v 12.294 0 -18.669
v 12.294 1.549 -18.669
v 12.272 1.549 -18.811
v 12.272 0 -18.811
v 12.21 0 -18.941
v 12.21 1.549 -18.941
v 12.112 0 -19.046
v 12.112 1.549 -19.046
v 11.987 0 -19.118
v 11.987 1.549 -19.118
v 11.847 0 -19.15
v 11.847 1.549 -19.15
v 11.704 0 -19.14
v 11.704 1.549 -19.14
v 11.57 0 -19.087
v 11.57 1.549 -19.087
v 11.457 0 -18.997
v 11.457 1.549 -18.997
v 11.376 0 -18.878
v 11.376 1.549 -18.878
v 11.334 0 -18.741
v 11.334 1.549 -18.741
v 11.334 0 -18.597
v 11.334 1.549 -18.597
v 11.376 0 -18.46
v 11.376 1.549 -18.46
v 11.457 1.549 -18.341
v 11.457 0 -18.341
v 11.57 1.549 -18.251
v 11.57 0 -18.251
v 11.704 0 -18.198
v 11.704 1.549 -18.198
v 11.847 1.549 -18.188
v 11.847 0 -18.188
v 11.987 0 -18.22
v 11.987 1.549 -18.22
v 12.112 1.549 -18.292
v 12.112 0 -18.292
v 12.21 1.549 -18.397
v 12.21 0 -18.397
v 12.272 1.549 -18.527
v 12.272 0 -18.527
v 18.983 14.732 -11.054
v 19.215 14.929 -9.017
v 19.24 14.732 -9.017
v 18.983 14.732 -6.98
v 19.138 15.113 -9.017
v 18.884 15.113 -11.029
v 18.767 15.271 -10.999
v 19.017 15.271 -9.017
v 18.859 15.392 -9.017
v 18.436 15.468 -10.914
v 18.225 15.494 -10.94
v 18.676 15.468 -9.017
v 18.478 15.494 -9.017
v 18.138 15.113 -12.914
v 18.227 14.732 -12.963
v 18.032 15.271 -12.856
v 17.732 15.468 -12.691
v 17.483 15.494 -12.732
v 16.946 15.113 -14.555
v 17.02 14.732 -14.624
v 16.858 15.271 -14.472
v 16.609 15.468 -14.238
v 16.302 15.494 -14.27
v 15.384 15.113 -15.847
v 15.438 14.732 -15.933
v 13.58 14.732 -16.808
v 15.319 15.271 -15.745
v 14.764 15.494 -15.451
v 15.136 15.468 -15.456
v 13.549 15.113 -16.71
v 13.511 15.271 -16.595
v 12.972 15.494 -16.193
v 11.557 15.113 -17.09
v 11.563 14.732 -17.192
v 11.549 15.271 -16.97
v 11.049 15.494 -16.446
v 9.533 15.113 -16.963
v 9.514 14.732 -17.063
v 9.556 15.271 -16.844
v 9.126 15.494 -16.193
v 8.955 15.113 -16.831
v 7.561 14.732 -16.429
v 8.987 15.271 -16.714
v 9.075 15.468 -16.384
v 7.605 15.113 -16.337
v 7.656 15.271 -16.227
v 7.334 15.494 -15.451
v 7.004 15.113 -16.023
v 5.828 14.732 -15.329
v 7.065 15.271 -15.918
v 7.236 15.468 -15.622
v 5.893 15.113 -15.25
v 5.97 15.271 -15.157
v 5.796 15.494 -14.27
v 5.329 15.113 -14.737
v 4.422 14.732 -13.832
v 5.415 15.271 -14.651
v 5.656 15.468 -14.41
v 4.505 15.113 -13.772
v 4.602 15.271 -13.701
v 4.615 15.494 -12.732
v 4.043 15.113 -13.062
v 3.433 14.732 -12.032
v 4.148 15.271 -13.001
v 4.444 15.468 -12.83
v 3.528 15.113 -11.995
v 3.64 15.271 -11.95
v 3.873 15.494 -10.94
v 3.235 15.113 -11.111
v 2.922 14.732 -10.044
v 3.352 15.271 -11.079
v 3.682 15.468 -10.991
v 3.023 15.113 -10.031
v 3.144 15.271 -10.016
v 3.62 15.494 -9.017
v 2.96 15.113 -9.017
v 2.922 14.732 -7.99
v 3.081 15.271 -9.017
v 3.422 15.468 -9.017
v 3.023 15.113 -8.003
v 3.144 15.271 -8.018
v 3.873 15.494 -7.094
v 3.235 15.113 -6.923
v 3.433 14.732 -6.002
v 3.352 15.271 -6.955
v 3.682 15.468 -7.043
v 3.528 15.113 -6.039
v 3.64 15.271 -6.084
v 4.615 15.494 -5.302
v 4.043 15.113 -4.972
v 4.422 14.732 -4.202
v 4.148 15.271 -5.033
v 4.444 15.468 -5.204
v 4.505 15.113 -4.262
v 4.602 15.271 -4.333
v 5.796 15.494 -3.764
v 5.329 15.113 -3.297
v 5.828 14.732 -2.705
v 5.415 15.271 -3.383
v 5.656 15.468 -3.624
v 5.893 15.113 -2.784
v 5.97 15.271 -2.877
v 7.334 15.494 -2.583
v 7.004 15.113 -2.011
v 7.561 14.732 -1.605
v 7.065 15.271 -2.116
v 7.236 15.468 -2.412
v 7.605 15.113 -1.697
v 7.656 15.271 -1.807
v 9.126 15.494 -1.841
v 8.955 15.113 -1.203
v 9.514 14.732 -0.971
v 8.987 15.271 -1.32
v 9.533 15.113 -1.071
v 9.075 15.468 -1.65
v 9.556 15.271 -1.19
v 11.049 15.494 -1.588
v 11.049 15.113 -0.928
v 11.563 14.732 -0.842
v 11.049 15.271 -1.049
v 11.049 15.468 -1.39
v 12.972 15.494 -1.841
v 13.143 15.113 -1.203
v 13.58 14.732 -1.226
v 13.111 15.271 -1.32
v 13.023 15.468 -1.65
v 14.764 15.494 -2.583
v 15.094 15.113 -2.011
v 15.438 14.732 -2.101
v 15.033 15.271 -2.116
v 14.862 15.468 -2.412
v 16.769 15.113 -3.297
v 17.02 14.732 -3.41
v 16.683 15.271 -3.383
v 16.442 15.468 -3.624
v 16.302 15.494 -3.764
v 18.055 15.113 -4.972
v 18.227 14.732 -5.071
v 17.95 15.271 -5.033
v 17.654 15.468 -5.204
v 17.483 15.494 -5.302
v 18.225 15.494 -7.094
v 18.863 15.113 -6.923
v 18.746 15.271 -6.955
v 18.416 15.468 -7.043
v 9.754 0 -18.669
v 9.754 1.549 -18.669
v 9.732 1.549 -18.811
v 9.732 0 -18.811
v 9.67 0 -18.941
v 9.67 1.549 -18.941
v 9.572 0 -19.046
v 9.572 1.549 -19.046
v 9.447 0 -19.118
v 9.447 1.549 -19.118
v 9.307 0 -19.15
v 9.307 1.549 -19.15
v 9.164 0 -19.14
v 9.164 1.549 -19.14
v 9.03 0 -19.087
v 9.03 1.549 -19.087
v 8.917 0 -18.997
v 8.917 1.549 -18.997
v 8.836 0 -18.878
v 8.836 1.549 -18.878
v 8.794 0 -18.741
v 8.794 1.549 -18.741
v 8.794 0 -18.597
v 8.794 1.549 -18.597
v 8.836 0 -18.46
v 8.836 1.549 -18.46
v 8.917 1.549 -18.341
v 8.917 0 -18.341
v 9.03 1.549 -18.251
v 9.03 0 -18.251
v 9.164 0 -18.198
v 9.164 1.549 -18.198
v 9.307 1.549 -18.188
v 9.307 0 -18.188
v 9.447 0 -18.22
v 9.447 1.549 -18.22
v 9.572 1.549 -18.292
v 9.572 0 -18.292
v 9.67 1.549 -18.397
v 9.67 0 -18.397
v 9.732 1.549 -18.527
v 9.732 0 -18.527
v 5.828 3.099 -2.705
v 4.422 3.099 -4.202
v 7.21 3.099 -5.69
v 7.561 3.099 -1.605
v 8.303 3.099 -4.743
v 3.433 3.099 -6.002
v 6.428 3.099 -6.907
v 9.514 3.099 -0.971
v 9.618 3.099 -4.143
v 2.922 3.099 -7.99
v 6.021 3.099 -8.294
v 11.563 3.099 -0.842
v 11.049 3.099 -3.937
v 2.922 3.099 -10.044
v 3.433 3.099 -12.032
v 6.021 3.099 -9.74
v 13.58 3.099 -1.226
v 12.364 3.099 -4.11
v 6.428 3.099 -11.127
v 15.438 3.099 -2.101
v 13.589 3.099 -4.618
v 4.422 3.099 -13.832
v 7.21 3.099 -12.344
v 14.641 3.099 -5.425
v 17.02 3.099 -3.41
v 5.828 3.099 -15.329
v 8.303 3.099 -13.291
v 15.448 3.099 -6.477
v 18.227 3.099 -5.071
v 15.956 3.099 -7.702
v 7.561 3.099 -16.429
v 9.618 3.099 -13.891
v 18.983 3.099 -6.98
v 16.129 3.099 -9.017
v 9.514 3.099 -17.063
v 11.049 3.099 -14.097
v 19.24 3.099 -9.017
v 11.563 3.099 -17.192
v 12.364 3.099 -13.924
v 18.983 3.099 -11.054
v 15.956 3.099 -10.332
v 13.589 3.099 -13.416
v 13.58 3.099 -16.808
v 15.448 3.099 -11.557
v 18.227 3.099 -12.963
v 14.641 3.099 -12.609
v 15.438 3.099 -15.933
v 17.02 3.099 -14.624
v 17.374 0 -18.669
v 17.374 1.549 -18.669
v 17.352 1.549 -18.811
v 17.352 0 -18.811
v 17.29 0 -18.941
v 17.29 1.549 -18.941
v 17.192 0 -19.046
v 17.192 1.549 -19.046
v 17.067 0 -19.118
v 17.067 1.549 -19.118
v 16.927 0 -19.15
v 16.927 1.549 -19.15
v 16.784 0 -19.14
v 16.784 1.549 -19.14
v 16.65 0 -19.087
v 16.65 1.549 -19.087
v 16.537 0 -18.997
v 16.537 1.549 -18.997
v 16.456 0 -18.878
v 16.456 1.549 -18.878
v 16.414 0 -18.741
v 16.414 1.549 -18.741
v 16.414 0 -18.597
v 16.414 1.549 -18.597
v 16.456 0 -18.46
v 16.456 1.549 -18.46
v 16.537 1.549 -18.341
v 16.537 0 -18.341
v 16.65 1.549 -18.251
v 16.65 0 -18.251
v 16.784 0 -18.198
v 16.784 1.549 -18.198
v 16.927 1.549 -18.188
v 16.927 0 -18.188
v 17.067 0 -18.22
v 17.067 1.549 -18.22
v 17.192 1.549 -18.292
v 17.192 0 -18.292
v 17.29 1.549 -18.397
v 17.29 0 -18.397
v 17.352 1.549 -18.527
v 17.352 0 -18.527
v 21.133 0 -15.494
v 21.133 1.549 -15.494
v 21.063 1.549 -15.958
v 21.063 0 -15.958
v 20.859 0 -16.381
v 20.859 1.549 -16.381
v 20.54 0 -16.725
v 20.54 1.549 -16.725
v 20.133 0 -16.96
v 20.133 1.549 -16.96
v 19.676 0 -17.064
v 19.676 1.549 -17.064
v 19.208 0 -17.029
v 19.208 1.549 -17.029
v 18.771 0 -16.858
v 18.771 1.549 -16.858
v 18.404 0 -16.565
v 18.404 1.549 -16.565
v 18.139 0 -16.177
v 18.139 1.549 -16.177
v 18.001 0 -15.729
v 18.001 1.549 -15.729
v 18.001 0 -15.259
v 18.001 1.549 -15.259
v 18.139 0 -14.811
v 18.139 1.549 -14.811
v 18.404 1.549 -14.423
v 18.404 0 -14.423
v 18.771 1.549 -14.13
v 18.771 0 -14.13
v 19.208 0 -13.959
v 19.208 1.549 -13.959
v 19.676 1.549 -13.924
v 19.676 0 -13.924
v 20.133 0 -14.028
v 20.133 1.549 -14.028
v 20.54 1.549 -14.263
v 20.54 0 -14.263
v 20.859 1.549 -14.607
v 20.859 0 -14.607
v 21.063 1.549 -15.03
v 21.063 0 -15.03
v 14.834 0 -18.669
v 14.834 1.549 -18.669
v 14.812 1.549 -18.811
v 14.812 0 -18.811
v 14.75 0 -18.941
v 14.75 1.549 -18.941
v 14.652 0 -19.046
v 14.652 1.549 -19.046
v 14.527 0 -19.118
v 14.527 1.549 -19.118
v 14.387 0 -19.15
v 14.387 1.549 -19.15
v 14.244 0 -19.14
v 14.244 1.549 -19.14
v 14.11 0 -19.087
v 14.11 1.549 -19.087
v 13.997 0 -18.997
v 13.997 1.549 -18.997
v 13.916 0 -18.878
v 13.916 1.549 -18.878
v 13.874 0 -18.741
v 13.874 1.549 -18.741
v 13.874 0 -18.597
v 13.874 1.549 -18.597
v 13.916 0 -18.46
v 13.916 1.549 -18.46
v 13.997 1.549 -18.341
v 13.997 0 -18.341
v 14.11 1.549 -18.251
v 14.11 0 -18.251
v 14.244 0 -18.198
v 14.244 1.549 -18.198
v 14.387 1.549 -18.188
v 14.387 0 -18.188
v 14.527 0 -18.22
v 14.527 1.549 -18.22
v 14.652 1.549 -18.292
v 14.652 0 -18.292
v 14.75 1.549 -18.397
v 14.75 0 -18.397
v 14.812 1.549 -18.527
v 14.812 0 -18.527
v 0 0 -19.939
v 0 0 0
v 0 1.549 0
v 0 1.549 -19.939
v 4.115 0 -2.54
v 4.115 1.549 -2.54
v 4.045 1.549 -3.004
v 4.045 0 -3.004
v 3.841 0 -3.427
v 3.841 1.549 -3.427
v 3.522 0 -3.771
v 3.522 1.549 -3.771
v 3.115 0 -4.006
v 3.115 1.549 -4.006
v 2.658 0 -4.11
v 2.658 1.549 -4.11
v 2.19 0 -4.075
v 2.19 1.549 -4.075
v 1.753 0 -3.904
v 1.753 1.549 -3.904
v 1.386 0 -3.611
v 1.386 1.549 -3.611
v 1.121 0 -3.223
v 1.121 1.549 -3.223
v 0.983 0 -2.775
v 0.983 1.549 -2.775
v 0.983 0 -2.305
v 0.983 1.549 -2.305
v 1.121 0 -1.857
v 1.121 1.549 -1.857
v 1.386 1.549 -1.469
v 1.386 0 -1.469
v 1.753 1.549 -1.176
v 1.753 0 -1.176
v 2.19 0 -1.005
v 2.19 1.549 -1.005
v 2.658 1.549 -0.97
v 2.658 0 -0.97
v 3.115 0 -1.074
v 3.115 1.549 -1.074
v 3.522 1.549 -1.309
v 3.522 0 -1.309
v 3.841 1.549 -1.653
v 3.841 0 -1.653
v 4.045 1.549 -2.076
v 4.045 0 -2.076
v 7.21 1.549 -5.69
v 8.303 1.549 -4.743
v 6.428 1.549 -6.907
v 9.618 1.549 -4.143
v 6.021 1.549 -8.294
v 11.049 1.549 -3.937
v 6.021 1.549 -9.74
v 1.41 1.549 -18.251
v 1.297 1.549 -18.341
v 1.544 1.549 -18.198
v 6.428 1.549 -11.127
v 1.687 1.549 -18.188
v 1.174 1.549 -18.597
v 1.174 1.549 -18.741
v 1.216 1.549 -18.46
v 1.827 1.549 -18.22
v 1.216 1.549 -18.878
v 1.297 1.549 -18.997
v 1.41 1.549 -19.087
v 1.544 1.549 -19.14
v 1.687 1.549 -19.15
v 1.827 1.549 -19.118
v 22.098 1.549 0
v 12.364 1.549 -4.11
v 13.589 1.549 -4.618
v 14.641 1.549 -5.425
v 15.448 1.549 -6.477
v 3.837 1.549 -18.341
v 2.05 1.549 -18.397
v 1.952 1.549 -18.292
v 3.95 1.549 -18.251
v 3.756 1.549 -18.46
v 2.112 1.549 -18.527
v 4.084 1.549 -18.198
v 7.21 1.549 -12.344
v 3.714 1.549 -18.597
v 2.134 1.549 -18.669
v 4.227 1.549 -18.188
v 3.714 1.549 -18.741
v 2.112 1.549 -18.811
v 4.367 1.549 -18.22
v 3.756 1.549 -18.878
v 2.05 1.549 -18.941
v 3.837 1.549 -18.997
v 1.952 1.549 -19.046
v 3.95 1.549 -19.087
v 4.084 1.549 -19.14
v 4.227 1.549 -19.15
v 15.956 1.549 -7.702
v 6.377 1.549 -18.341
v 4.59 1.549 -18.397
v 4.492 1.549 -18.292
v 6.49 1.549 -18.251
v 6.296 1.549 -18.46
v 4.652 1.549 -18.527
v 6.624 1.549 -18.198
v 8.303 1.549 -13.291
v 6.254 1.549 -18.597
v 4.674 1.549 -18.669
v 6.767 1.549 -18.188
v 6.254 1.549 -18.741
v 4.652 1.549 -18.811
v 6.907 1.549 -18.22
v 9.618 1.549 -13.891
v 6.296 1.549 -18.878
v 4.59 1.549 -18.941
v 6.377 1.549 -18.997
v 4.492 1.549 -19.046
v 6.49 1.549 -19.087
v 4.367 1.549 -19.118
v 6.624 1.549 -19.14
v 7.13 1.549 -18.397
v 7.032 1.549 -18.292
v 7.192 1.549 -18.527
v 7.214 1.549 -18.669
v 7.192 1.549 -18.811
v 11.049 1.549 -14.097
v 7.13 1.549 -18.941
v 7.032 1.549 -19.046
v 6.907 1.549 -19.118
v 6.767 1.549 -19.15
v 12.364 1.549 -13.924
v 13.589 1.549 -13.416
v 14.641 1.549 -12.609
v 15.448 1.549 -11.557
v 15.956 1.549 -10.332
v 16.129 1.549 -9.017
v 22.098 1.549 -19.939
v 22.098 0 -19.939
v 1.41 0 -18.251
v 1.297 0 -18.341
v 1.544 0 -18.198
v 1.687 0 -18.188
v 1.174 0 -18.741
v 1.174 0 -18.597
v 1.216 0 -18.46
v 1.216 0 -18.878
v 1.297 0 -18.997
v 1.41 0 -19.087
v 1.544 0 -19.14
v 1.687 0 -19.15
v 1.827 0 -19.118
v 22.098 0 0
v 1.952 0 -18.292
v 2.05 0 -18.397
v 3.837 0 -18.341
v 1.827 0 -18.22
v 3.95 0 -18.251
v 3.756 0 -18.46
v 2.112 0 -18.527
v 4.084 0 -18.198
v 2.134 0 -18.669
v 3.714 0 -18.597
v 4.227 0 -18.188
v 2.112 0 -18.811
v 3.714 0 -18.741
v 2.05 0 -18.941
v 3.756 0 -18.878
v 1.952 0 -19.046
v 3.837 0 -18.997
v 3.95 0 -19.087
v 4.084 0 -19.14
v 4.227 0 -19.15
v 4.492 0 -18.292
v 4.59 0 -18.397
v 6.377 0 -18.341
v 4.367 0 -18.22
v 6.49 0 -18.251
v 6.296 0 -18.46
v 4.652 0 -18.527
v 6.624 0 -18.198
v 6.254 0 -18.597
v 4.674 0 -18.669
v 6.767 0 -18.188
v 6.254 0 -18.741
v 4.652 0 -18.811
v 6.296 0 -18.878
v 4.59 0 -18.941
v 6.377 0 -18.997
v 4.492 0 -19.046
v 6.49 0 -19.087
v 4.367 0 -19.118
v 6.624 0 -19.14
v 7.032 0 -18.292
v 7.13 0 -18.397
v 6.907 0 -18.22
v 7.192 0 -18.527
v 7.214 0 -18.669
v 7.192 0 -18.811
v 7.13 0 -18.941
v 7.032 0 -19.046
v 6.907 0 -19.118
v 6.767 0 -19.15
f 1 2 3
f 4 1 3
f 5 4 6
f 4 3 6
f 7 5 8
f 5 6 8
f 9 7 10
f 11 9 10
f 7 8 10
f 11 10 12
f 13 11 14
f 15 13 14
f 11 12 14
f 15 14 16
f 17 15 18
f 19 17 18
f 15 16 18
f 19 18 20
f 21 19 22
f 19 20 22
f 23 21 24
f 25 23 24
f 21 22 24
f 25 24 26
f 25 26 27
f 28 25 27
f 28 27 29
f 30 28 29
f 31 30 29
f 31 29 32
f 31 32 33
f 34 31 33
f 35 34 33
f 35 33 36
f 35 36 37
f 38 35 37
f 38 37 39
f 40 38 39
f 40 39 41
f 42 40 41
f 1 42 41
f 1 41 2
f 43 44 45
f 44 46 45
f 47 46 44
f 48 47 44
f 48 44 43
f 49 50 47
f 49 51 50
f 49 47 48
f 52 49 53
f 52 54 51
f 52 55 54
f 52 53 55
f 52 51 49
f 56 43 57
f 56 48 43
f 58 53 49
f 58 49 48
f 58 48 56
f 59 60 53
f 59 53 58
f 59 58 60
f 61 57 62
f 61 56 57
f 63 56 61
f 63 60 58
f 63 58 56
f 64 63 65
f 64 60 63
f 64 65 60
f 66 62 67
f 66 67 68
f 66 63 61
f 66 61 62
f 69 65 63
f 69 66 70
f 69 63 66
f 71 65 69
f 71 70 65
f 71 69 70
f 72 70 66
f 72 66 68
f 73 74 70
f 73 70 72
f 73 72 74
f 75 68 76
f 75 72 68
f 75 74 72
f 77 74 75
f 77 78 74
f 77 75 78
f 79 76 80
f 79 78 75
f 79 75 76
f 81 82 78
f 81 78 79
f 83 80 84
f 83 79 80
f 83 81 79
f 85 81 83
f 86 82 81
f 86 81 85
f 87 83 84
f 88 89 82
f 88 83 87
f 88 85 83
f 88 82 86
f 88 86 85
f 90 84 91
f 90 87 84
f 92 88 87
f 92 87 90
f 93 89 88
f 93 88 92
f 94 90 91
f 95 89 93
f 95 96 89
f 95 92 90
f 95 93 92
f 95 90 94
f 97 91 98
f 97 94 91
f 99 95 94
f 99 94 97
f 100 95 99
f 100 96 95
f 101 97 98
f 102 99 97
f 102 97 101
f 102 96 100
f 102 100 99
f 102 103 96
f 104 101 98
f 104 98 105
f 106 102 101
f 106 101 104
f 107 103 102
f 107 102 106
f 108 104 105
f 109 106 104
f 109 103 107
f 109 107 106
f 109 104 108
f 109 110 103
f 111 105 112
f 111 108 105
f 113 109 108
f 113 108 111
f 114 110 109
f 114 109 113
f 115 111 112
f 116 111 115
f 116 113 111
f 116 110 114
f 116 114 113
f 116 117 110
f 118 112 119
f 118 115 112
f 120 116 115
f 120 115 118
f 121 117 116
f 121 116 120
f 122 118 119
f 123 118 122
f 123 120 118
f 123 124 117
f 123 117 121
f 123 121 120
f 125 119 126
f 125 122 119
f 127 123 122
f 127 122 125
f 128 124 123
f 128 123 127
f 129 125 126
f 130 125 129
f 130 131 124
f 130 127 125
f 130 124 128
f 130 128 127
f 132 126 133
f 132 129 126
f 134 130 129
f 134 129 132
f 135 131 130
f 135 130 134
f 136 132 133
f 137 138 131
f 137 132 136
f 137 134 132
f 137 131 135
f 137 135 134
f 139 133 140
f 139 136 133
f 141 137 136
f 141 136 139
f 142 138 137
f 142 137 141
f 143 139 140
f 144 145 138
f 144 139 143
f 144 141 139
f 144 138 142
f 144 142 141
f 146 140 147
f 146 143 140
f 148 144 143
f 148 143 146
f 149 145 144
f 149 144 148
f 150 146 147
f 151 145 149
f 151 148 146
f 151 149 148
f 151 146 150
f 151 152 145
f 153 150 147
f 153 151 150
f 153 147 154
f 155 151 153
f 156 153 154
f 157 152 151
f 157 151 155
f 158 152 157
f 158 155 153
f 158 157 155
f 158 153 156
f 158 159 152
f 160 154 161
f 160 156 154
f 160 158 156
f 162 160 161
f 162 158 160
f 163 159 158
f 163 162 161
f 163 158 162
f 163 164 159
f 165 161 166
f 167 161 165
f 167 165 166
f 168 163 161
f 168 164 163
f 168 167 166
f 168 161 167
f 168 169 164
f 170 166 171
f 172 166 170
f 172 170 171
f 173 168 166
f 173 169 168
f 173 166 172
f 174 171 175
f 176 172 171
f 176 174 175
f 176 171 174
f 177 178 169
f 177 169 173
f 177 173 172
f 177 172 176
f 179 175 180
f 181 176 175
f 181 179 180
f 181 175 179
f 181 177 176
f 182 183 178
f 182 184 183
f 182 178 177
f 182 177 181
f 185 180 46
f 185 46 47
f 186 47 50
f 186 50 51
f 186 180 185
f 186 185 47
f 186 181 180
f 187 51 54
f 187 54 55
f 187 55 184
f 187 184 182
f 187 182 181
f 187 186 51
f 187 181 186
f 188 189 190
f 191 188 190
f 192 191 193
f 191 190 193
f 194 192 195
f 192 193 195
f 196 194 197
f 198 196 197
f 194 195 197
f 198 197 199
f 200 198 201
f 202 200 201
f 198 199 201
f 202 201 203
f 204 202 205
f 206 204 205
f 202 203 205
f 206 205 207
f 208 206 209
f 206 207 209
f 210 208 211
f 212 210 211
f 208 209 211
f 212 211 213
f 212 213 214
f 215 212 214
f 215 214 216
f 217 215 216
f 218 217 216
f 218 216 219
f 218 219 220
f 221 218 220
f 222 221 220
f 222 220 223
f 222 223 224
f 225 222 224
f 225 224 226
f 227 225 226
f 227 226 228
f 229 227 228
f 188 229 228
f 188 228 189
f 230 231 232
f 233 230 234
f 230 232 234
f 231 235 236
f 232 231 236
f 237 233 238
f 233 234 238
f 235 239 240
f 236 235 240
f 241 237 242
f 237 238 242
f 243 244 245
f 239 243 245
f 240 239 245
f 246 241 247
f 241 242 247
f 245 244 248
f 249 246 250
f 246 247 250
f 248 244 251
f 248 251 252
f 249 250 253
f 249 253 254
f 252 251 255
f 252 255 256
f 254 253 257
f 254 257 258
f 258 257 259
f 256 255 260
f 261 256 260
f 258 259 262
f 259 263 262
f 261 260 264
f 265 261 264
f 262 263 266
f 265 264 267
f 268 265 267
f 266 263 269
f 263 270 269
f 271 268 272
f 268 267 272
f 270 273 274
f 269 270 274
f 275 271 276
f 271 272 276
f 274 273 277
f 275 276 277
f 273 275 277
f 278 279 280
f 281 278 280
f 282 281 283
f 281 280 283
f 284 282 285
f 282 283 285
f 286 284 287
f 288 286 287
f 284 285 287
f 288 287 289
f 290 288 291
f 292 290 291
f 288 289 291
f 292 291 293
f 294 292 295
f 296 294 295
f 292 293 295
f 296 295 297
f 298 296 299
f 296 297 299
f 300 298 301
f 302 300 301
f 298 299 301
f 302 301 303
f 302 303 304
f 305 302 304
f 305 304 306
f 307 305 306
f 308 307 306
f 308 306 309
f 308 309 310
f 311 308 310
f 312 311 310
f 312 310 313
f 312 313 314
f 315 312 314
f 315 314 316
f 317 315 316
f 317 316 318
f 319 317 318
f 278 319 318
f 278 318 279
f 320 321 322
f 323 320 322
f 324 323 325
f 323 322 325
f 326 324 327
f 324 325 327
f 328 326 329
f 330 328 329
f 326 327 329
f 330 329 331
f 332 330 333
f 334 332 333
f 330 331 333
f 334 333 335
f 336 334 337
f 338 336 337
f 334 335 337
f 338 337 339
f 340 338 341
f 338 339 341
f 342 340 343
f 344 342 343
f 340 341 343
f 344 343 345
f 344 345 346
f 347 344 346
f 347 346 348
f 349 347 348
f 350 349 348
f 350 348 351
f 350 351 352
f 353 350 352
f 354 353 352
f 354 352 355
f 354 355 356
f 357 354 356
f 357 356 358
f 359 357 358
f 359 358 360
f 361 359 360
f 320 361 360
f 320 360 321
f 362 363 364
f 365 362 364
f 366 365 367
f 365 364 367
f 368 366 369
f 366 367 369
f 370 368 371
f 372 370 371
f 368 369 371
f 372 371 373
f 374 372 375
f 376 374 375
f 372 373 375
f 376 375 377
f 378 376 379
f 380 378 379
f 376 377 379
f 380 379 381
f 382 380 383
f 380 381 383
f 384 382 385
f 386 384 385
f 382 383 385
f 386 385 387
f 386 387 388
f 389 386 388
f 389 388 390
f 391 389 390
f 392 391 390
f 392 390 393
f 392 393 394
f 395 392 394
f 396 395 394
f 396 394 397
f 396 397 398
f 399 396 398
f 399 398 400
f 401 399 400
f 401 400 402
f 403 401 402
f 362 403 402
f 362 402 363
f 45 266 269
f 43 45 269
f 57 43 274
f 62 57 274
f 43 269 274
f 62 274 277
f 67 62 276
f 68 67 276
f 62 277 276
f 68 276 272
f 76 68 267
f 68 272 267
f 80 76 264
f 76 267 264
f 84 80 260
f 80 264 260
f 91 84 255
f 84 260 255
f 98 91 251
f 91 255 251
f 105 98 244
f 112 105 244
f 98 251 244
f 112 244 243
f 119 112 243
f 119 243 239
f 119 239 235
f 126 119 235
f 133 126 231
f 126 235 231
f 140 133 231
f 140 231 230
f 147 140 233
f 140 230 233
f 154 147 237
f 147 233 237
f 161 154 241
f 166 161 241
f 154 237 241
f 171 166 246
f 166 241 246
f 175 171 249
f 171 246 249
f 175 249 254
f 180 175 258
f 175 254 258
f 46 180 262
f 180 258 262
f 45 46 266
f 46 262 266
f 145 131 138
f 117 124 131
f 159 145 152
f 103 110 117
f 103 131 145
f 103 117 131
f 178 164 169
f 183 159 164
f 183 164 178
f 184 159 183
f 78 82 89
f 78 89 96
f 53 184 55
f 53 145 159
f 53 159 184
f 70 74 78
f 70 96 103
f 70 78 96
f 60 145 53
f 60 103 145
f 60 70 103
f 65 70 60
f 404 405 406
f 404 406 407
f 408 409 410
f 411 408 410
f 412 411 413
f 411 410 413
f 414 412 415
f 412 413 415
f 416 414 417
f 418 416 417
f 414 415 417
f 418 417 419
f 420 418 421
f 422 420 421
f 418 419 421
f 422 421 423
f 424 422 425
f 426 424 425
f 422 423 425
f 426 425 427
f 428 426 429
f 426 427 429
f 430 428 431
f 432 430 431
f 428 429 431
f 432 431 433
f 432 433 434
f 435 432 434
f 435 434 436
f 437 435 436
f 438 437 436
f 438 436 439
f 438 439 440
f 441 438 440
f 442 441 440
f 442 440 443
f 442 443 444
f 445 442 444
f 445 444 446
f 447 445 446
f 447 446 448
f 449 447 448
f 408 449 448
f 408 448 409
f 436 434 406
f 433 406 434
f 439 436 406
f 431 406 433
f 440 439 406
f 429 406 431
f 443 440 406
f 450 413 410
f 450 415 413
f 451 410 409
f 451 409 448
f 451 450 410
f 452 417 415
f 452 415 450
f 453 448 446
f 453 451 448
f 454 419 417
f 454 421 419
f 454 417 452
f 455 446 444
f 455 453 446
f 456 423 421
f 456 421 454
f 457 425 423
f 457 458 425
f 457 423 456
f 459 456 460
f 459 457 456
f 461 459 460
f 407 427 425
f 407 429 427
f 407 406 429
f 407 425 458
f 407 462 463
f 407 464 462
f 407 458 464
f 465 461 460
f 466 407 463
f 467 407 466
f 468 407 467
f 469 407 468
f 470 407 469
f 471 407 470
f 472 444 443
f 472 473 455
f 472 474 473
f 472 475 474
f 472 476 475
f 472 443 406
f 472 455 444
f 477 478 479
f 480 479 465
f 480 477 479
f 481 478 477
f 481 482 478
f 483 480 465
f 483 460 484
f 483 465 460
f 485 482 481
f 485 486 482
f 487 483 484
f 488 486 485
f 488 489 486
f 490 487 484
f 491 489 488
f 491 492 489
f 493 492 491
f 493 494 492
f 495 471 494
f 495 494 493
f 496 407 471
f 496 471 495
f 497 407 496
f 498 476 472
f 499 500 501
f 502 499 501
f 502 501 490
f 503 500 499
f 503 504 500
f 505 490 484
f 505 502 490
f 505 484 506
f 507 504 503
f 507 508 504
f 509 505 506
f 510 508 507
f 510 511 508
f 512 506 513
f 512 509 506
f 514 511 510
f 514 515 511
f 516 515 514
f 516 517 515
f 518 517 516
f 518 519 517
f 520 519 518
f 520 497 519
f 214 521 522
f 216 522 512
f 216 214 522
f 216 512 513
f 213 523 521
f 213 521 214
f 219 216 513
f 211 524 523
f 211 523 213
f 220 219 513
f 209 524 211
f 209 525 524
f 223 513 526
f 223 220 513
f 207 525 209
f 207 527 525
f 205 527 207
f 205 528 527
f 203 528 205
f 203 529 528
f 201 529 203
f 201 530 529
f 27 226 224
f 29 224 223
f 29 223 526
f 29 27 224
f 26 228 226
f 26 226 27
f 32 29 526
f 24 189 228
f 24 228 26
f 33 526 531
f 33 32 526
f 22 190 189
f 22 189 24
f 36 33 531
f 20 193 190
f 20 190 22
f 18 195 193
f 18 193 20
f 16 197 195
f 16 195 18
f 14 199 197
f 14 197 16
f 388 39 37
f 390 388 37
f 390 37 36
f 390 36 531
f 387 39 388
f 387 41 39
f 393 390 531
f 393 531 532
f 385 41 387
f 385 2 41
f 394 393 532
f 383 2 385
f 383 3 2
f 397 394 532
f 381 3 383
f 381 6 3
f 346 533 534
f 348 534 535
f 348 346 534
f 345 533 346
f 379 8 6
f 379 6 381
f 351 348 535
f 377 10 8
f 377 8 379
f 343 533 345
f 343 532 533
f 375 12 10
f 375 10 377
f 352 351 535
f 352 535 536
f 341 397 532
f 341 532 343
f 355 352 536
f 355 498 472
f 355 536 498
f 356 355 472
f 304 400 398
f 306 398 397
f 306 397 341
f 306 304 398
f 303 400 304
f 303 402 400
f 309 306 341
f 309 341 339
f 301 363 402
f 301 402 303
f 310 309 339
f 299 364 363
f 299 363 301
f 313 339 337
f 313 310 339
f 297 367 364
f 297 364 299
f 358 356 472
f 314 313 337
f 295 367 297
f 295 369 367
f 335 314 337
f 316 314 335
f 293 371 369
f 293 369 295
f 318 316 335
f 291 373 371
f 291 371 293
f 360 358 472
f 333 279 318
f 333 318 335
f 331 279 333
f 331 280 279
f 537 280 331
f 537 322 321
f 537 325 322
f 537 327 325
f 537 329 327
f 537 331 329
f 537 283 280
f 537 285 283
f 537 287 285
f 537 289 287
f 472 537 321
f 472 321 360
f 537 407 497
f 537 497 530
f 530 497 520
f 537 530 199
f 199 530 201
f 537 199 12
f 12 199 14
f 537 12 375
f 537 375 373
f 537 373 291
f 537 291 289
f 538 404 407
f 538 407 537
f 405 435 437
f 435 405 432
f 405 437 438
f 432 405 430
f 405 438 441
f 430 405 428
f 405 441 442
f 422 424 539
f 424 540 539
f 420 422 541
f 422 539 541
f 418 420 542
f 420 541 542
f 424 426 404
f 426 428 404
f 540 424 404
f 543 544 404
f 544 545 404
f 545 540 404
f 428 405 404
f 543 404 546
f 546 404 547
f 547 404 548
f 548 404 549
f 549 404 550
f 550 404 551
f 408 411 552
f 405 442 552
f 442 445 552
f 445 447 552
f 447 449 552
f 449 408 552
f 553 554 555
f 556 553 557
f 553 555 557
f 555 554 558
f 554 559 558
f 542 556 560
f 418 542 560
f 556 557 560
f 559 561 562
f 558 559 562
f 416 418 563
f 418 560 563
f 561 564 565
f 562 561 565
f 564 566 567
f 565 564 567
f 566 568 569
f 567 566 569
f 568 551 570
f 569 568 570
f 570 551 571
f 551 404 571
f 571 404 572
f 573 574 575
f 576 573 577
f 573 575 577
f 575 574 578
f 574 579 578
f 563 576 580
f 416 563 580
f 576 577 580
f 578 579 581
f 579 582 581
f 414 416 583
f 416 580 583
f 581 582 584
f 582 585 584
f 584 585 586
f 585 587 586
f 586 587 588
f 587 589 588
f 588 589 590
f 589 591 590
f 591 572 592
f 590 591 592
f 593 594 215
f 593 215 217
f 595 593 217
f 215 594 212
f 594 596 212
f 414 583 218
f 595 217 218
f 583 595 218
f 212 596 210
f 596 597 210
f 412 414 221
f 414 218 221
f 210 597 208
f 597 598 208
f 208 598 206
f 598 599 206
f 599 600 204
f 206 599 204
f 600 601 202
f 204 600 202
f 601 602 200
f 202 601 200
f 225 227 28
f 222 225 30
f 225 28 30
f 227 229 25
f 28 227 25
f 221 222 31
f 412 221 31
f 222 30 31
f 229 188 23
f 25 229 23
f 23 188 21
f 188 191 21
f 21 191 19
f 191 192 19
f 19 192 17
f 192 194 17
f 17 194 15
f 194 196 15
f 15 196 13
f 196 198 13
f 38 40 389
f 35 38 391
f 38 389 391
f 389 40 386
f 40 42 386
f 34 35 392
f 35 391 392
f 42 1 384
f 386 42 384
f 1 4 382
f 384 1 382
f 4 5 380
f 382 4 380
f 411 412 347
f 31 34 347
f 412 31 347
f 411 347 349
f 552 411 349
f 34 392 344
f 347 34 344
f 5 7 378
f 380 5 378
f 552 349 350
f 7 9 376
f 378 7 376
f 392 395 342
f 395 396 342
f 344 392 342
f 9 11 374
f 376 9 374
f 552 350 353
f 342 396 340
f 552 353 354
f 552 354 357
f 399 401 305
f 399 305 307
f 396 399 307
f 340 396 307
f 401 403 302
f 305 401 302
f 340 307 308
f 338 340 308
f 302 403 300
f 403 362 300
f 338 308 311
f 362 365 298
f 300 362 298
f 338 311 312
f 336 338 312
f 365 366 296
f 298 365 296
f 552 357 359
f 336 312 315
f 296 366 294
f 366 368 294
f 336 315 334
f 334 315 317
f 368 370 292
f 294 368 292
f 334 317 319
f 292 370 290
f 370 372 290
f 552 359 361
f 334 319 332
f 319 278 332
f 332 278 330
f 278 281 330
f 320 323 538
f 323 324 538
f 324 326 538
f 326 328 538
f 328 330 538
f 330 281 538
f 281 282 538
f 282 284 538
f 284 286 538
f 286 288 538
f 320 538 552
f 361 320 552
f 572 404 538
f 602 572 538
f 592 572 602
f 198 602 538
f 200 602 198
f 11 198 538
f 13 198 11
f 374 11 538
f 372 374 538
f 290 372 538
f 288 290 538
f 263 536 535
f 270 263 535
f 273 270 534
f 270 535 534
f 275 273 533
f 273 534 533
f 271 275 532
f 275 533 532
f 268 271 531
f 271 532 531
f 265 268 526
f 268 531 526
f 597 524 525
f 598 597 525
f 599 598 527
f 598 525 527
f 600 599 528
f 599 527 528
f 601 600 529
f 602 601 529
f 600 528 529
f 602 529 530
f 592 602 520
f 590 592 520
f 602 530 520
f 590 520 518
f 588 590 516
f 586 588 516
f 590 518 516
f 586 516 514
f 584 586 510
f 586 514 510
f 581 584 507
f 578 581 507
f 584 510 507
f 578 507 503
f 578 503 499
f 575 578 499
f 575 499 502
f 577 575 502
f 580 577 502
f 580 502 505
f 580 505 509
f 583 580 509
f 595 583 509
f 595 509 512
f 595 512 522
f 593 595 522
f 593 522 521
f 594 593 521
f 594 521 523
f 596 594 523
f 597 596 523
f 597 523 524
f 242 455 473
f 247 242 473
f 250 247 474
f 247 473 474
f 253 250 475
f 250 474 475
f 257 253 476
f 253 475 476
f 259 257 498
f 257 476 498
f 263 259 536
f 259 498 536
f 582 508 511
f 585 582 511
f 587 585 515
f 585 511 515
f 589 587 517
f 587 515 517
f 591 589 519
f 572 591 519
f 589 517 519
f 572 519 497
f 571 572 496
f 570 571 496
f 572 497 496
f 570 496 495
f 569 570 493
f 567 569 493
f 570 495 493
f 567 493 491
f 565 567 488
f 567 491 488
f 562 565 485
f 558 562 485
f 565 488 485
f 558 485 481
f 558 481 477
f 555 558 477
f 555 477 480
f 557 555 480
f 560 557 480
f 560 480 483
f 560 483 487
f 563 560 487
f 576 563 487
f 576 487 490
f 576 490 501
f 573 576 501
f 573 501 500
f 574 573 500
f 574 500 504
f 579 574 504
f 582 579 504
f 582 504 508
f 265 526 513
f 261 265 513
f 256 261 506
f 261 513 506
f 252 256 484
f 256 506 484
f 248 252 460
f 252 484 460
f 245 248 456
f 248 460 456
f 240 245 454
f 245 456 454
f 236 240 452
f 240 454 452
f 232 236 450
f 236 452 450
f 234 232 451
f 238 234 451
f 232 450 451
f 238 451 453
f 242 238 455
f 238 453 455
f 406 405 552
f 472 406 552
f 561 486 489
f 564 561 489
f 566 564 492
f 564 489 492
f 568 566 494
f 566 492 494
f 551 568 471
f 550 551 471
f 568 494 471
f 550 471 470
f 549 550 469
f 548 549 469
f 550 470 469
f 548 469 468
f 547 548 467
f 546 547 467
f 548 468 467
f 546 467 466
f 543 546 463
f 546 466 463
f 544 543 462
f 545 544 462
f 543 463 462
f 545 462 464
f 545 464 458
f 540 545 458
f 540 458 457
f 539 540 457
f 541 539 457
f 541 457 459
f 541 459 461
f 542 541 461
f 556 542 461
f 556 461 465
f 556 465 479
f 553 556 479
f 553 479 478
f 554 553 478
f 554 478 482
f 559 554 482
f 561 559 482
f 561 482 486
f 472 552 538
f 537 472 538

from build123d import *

# Parameters (mm, degrees)
SKETCH2_W           = 22.098
SKETCH2_H           = 19.939
BOSS_EXTRUDE1_DEPTH = 1.5494
BOSS_EXTRUDE3_DEPTH = 1.5494
SKETCH7_R           = 8.1915
BOSS_EXTRUDE4_DEPTH = 12.3952
SKETCH8_R           = 1.5748
SKETCH8_R_2         = 0.4826
CUT_EXTRUDE1_DEPTH  = 2.5494
FILLET1_R           = 0.762


with BuildPart() as part:
    # Sketch2 → Boss-Extrude1 (new body)
    with BuildSketch(Plane(origin=(0, 0, 0), x_dir=(1, 0, 0), z_dir=(0, 1, 0))):
        with Locations((11.049, 9.9695)):
            Rectangle(SKETCH2_W, SKETCH2_H)
    extrude(amount=BOSS_EXTRUDE1_DEPTH)

    # Sketch6 → Boss-Extrude3 (add)
    with BuildSketch(Plane(origin=(0, 1.5494, 0), x_dir=(1, 0, 0), z_dir=(0, 1, 0))):
        with BuildLine():
            ThreePointArc((16.129, 9.017), (14.641102448, 12.609102448), (11.049, 14.097))
            Line((11.049, 14.097), (11.049, 9.017))
            Line((11.049, 9.017), (11.049, 3.937))
            ThreePointArc((11.049, 3.937), (14.641102448, 5.424897552), (16.129, 9.017))
        make_face()
        with BuildLine():
            Line((11.049, 9.017), (11.049, 14.097))
            ThreePointArc((11.049, 14.097), (5.969, 9.017), (11.049, 3.937))
            Line((11.049, 3.937), (11.049, 9.017))
        make_face()
    extrude(amount=BOSS_EXTRUDE3_DEPTH)

    # Sketch7 → Boss-Extrude4 (add)
    with BuildSketch(Plane(origin=(0, 3.0988, 0), x_dir=(1, 0, 0), z_dir=(0, 1, 0))):
        with Locations((11.049, 9.017)):
            Circle(SKETCH7_R)
    extrude(amount=BOSS_EXTRUDE4_DEPTH)

    # Sketch8 → Cut-Extrude1 (cut, through all)
    with BuildSketch(Plane(origin=(0, 1.5494, 0), x_dir=(1, 0, 0), z_dir=(0, 1, 0))):
        with Locations((19.558, 15.494)):
            Circle(SKETCH8_R)
        with Locations((2.54, 2.54)):
            Circle(SKETCH8_R)
        with Locations((16.891, 18.669)):
            Circle(SKETCH8_R_2)
        with Locations((14.351, 18.669)):
            Circle(SKETCH8_R_2)
        with Locations((11.811, 18.669)):
            Circle(SKETCH8_R_2)
        with Locations((9.271, 18.669)):
            Circle(SKETCH8_R_2)
        with Locations((6.731, 18.669)):
            Circle(SKETCH8_R_2)
        with Locations((4.191, 18.669)):
            Circle(SKETCH8_R_2)
        with Locations((1.651, 18.669)):
            Circle(SKETCH8_R_2)
    extrude(amount=-CUT_EXTRUDE1_DEPTH, mode=Mode.SUBTRACT)

    # Fillet1
    fillet1_edges = [part.edges().sort_by_distance(p)[0] for p in [
        (2.8575, 15.494, -9.017),
    ]]
    fillet(fillet1_edges, radius=FILLET1_R)


solid = part.part
